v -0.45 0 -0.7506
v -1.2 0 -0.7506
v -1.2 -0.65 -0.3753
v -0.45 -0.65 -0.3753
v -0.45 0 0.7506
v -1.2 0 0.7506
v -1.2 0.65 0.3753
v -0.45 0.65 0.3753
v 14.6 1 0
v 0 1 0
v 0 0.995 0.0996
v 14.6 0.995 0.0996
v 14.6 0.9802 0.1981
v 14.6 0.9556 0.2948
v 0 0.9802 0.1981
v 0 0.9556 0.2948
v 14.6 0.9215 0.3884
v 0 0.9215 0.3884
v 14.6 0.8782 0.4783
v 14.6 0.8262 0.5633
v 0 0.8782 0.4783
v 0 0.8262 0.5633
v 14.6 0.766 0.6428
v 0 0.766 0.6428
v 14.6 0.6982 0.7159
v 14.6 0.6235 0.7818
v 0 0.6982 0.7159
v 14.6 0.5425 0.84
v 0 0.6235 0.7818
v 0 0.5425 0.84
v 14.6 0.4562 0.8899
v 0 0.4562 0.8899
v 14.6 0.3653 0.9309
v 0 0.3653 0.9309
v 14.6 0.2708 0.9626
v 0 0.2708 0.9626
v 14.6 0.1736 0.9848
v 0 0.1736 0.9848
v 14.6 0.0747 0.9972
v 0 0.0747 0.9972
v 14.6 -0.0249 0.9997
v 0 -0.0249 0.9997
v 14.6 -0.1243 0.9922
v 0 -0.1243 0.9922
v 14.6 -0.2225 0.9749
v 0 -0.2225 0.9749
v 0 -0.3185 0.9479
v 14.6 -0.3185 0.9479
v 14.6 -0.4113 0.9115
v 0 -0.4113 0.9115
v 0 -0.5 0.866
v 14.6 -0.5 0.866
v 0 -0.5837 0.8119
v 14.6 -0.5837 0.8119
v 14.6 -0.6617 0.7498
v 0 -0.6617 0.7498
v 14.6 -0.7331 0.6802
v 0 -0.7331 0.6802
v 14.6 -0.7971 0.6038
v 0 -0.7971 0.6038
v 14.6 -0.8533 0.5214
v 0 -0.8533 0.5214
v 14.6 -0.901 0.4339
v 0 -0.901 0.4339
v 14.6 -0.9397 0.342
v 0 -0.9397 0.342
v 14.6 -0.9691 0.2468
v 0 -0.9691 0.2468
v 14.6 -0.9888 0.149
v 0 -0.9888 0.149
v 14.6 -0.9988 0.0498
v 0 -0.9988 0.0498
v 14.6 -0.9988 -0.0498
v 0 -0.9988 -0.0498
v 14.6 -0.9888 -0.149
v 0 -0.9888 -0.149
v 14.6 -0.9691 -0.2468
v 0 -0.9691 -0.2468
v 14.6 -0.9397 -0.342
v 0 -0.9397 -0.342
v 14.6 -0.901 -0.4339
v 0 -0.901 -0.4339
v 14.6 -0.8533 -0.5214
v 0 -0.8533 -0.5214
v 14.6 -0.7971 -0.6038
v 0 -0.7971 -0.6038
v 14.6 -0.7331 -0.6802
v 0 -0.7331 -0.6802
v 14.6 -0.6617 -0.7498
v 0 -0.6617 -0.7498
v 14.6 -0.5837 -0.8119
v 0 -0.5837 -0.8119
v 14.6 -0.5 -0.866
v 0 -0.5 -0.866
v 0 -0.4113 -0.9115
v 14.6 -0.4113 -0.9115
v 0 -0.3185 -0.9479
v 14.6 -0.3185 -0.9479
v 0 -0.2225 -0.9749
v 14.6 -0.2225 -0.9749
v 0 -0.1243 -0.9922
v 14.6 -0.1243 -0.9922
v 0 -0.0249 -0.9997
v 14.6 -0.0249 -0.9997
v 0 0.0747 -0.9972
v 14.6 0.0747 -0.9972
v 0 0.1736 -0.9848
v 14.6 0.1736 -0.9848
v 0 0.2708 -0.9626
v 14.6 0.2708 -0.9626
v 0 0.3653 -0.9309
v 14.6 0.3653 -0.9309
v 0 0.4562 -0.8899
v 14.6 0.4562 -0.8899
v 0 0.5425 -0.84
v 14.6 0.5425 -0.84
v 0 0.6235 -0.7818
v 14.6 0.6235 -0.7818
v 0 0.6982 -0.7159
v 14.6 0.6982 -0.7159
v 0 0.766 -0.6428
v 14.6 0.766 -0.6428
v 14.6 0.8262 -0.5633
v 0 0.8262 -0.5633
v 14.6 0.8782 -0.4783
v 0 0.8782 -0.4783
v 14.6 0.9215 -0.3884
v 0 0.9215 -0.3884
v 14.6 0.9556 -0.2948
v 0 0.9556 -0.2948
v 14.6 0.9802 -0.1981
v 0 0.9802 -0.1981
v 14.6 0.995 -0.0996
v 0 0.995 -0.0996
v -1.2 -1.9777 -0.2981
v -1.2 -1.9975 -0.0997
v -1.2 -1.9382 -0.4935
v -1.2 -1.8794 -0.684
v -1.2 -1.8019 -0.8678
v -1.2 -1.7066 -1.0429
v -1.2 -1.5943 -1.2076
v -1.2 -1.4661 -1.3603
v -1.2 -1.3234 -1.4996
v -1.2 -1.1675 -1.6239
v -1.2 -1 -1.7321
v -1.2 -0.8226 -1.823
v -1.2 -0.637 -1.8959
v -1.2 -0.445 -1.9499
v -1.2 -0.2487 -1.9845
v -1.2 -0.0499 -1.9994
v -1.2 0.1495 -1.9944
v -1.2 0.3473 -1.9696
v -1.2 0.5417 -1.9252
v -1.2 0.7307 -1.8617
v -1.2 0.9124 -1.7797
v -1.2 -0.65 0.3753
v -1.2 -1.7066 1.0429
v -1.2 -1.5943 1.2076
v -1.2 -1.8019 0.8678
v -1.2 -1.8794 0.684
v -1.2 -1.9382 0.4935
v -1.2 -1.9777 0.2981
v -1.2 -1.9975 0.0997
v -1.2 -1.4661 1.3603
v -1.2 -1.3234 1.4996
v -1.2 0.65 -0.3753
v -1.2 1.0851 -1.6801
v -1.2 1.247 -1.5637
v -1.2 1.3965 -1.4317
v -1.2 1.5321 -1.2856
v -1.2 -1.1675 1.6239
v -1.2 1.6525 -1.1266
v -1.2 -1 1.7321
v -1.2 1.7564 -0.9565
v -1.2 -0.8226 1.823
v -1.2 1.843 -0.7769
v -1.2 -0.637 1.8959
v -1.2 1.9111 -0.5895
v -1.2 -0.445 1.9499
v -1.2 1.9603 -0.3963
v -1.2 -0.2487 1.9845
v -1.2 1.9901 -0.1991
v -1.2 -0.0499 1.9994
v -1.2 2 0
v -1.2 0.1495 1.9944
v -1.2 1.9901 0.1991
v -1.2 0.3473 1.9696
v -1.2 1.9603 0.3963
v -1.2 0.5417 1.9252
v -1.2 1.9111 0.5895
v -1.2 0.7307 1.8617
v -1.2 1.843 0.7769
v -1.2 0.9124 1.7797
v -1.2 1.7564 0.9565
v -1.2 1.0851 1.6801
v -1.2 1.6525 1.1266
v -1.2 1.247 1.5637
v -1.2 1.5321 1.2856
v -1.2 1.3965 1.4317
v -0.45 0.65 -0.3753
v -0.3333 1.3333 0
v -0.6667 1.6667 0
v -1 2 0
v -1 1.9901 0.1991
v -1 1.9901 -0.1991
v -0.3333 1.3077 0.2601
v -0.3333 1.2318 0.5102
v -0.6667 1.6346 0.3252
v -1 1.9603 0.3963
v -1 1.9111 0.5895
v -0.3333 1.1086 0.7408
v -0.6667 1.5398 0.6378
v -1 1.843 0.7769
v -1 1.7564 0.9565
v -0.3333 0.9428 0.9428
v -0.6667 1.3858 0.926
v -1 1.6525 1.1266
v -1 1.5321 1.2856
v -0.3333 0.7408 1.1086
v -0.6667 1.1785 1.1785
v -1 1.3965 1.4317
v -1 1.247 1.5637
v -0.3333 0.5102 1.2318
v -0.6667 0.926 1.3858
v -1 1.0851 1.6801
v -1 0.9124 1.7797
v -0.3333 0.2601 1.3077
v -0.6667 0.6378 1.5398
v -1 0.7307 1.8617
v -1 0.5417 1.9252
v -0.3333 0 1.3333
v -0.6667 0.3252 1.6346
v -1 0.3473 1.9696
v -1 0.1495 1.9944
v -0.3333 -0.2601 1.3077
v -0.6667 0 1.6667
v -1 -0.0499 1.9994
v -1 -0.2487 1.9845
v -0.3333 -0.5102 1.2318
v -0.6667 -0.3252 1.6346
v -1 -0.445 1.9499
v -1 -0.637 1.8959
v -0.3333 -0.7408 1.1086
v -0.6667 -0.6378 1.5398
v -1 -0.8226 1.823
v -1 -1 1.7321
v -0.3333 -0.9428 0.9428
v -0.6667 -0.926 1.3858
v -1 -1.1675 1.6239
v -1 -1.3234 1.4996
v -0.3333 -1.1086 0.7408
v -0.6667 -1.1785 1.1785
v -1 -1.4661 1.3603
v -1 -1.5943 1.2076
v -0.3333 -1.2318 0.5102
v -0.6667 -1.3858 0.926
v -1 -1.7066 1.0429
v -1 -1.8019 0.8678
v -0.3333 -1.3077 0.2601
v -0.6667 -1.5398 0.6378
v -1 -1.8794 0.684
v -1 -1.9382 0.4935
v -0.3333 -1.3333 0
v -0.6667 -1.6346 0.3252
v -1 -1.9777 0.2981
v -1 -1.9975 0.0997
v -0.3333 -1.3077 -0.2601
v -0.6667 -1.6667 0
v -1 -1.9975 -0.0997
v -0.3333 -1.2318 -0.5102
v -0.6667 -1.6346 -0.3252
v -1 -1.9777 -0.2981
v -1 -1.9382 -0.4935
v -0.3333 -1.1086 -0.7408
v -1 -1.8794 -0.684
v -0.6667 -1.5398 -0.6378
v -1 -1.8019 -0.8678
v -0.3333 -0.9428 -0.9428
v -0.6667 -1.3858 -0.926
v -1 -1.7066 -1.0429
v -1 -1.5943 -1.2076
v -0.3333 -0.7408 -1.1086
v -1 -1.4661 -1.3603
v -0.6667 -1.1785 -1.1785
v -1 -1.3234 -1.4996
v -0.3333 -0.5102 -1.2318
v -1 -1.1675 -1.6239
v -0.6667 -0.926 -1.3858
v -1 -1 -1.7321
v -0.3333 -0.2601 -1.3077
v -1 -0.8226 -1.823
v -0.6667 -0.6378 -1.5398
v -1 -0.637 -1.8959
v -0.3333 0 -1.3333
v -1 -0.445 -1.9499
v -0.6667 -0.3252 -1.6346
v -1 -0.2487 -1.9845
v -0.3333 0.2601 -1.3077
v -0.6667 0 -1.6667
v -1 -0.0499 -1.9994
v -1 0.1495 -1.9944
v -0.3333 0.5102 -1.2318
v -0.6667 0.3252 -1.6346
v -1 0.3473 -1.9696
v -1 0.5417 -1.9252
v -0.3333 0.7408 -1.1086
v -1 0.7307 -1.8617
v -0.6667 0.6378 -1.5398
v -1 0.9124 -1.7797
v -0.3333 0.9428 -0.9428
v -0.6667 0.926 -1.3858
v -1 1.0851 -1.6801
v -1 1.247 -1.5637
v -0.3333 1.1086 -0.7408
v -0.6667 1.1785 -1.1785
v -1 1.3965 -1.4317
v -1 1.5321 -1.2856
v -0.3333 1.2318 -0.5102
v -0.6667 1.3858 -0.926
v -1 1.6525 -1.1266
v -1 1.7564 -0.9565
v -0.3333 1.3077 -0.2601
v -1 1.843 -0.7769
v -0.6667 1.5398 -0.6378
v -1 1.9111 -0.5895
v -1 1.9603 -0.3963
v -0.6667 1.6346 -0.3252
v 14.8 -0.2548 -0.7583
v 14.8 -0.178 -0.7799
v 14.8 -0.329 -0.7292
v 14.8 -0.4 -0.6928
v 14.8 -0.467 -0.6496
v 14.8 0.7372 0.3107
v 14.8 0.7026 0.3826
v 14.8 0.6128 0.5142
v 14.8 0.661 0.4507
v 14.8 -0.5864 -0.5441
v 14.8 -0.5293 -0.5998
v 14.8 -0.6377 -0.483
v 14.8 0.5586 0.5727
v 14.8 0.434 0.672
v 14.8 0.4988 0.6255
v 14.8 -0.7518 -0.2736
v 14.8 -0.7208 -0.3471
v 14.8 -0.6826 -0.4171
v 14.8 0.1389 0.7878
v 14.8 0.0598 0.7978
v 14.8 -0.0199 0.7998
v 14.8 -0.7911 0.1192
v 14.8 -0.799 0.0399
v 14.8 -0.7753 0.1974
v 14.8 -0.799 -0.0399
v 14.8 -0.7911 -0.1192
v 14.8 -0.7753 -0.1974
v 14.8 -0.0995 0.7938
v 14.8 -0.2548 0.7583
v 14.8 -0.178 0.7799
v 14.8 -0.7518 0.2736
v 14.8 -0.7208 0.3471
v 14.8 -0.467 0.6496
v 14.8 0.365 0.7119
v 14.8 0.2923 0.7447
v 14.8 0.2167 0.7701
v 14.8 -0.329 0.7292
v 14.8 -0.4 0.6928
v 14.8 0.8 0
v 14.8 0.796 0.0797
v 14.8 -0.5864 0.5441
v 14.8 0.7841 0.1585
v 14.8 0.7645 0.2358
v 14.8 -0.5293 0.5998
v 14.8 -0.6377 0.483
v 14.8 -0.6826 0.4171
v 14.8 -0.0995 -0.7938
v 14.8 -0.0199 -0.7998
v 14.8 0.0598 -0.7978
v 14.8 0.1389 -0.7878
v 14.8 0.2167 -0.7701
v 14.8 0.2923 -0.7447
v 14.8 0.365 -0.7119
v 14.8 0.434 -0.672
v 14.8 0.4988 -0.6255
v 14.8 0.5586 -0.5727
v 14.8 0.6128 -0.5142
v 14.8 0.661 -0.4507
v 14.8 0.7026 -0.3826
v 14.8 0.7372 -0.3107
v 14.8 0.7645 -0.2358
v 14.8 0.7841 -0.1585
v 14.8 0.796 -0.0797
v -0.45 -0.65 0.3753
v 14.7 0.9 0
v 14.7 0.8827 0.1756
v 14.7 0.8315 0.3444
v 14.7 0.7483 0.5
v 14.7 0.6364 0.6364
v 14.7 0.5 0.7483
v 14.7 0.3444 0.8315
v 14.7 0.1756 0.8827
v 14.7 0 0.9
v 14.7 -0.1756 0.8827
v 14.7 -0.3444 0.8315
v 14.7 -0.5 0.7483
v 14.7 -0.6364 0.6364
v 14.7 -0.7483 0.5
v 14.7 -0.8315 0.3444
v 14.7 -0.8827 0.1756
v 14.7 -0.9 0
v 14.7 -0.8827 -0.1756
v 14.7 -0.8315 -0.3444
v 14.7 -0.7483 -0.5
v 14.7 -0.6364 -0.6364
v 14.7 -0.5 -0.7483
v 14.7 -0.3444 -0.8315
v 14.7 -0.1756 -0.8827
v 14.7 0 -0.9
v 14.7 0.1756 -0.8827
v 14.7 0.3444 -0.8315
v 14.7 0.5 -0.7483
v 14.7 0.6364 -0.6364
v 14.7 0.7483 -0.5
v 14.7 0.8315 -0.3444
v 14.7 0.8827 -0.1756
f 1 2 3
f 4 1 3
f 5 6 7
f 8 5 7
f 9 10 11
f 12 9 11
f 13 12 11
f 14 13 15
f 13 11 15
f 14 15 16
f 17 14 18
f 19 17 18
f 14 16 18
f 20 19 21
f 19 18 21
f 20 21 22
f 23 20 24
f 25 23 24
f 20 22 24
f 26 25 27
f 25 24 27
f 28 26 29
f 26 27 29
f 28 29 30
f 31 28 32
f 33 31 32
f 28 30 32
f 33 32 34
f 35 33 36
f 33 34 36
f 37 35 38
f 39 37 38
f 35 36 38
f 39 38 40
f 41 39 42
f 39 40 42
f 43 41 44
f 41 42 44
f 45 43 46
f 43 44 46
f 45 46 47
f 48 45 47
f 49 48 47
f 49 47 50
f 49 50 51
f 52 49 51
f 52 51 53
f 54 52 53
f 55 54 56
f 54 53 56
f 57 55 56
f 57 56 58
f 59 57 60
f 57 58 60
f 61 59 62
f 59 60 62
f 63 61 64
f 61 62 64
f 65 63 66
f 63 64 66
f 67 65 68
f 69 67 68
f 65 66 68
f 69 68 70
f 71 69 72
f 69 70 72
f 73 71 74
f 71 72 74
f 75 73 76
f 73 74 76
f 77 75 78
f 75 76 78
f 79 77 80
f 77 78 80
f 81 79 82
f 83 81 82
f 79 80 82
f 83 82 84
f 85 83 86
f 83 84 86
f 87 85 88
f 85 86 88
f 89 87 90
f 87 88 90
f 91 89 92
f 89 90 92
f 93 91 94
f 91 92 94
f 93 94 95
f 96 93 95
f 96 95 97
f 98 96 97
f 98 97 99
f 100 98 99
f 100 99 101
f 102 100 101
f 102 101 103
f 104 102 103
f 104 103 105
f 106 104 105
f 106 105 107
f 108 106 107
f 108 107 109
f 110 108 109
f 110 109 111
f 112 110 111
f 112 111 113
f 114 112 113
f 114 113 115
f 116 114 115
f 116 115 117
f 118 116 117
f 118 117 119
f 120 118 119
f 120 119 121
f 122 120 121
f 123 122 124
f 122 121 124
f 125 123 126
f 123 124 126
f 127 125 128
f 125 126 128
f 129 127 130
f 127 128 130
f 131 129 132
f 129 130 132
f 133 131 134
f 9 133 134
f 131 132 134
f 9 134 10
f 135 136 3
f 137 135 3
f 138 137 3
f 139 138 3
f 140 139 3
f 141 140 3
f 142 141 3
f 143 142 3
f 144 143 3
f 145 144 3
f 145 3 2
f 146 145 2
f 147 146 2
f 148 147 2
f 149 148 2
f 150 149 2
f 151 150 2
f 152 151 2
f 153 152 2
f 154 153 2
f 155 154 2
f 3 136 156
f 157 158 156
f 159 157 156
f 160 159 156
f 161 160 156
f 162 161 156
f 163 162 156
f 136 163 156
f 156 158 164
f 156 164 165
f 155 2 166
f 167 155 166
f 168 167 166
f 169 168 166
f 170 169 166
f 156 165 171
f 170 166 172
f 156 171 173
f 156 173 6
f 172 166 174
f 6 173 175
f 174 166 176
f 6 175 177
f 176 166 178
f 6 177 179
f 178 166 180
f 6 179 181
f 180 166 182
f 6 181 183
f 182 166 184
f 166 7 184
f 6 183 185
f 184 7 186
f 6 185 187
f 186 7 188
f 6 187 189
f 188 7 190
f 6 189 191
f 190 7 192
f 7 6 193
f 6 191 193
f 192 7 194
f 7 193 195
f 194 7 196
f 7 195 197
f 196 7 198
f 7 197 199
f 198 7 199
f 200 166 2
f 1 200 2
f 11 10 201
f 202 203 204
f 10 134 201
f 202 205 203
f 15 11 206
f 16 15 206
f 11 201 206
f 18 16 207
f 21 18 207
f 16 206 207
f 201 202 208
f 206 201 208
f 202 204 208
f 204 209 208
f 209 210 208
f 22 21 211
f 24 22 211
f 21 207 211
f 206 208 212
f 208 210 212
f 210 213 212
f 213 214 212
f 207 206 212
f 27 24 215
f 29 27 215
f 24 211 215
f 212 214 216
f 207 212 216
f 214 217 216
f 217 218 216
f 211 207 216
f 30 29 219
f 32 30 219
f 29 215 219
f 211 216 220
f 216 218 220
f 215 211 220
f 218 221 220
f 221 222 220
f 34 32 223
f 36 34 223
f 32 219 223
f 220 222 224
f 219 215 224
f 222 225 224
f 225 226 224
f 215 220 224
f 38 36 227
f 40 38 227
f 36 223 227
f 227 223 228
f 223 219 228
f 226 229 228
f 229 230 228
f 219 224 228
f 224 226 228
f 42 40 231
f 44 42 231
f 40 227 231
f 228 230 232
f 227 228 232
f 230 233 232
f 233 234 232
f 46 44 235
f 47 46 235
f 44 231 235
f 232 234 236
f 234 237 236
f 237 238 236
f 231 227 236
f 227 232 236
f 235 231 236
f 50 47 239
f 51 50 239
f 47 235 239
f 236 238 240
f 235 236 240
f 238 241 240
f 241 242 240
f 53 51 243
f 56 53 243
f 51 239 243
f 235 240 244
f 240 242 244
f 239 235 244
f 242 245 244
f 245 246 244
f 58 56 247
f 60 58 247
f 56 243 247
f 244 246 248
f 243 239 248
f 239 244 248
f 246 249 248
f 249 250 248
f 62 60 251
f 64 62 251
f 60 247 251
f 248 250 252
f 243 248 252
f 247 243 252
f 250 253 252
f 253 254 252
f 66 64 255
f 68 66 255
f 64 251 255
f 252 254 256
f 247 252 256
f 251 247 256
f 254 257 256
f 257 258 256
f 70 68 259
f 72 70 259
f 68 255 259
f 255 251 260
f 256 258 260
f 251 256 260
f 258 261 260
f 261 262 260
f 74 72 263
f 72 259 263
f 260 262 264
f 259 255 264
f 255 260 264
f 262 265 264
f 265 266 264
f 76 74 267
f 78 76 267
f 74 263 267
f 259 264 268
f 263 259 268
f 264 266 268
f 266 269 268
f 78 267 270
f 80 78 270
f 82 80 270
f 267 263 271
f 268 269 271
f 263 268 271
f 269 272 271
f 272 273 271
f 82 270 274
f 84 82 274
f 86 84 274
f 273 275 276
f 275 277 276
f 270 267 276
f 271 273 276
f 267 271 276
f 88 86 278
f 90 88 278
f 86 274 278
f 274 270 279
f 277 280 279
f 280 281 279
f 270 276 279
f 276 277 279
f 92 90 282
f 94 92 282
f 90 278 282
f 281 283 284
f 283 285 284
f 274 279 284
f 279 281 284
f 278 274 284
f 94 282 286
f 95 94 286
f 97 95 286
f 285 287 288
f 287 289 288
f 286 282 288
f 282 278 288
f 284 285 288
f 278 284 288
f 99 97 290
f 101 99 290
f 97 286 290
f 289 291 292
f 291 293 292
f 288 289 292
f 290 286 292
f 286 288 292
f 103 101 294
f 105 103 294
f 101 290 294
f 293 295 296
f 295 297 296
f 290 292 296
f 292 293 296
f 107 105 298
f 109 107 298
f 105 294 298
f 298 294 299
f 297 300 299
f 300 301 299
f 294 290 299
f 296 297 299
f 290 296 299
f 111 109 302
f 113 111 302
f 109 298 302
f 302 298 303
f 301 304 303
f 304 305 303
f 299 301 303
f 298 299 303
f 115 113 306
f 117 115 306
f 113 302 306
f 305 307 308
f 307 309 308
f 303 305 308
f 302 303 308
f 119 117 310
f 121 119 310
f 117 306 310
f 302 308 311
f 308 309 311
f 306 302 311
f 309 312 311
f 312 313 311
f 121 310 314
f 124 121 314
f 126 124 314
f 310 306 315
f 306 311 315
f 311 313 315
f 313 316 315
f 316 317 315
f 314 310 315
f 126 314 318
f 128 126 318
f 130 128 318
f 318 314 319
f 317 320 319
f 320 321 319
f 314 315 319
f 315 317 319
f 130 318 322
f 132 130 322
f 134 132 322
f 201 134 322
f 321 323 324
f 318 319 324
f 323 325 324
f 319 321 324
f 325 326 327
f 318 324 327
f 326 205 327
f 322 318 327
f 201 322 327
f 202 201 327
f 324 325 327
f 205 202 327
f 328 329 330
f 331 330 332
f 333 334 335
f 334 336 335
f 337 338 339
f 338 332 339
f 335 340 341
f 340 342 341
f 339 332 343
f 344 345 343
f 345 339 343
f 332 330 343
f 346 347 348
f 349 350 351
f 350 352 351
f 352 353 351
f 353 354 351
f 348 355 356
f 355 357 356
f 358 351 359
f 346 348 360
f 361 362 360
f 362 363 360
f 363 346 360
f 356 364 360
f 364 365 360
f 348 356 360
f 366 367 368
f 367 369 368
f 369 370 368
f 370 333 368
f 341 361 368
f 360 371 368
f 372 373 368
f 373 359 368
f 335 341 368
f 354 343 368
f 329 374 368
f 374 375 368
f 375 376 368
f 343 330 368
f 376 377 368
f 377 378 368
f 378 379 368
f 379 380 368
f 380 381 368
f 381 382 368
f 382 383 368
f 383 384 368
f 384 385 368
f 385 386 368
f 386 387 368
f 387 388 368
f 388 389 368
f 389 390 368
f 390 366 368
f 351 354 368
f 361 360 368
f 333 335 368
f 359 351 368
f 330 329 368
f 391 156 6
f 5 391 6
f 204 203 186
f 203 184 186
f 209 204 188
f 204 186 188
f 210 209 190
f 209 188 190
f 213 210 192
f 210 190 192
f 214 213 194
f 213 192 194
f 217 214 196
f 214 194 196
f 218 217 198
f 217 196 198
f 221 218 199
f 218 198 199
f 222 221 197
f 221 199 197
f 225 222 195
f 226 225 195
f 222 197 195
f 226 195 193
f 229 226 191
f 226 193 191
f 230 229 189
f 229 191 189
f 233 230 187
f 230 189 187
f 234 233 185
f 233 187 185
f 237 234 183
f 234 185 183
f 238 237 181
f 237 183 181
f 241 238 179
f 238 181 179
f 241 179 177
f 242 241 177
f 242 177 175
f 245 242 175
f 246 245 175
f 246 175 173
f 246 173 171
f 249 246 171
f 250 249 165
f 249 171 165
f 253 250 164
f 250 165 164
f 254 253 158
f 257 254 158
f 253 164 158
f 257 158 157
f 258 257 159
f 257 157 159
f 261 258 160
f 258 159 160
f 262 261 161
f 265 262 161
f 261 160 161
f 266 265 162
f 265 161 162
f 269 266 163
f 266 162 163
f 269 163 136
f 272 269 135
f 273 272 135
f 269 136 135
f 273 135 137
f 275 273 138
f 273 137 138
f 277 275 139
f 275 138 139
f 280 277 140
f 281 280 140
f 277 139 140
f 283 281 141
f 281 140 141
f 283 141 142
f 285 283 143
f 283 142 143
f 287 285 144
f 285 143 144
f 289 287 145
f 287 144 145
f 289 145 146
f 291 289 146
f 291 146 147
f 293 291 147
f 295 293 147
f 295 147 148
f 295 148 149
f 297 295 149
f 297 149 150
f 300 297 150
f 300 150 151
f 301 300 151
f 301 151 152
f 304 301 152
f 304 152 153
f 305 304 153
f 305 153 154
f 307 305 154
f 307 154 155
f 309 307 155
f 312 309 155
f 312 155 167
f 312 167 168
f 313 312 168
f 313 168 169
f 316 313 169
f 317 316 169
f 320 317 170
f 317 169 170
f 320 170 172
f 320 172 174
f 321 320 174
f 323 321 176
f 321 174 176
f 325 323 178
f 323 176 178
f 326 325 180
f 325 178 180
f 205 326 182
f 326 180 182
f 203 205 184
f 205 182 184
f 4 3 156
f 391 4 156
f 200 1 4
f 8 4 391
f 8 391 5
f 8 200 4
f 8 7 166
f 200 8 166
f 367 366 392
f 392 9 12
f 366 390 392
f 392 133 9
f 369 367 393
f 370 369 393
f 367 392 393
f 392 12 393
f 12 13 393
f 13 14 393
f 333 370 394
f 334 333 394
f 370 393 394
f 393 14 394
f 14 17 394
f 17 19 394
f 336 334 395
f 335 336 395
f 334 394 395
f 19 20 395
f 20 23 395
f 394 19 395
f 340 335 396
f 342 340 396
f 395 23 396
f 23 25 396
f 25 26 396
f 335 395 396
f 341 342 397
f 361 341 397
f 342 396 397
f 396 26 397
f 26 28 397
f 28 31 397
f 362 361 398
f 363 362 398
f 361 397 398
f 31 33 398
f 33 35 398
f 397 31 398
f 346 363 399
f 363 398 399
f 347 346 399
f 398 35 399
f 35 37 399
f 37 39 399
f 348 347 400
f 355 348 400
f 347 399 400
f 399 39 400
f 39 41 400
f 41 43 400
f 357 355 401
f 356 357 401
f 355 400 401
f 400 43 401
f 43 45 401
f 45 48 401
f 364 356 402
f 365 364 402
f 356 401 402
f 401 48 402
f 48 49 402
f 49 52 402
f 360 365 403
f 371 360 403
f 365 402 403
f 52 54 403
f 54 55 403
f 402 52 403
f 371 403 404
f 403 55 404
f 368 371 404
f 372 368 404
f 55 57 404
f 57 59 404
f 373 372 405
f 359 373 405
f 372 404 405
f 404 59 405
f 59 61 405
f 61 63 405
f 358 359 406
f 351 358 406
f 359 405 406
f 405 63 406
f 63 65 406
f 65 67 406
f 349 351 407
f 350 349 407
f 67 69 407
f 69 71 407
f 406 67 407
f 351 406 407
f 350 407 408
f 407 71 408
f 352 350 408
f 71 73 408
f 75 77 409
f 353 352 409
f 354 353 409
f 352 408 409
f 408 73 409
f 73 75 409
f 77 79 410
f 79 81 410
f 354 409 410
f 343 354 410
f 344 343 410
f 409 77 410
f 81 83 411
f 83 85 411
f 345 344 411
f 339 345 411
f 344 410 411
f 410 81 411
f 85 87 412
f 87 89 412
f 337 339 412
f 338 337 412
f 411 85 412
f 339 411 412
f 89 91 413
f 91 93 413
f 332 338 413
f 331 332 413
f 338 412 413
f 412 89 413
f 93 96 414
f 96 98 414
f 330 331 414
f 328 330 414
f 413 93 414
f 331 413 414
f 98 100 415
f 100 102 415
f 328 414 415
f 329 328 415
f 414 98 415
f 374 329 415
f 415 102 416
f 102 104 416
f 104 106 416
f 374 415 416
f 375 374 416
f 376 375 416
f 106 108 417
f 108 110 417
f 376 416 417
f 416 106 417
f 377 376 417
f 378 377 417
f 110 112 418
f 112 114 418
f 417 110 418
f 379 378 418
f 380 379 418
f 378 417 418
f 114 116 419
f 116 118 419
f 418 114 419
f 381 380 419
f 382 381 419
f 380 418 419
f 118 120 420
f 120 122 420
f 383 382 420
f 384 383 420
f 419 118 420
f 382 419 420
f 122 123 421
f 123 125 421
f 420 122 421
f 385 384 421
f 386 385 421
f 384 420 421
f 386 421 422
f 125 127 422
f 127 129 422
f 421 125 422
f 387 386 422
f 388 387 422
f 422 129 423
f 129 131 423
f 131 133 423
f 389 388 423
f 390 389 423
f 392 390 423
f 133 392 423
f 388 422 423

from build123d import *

# Parameters (mm, degrees)
CHAMFER1_SIZE      = 0.2
CUT_EXTRUDE1_DEPTH = 0.75


with BuildPart() as part:
    # Sketch1 → Revolve1 (revolve)
    with BuildSketch(Plane.XY):
        Polygon((0, 1), (-1, 2), (-1.2, 2), (-1.2, 0), (14.8, 0), (14.8, 1), align=None)
    revolve(axis=Axis((-1.2, 0, 0), (1, 0, 0)))

    # Chamfer1
    chamfer1_edges = [part.edges().sort_by_distance(p)[0] for p in [
        (14.8, -1, 0),
    ]]
    chamfer(chamfer1_edges, length=CHAMFER1_SIZE)

    # Sketch2 → Cut-Extrude1 (cut)
    with BuildSketch(Plane.ZY.offset(1.2)):
        Polygon((-0.75055535, 0), (-0.375277675, -0.65), (0.375277675, -0.65), (0.75055535, 0), (0.375277675, 0.65), (-0.375277675, 0.65), align=None)
    extrude(amount=-CUT_EXTRUDE1_DEPTH, mode=Mode.SUBTRACT)


solid = part.part
